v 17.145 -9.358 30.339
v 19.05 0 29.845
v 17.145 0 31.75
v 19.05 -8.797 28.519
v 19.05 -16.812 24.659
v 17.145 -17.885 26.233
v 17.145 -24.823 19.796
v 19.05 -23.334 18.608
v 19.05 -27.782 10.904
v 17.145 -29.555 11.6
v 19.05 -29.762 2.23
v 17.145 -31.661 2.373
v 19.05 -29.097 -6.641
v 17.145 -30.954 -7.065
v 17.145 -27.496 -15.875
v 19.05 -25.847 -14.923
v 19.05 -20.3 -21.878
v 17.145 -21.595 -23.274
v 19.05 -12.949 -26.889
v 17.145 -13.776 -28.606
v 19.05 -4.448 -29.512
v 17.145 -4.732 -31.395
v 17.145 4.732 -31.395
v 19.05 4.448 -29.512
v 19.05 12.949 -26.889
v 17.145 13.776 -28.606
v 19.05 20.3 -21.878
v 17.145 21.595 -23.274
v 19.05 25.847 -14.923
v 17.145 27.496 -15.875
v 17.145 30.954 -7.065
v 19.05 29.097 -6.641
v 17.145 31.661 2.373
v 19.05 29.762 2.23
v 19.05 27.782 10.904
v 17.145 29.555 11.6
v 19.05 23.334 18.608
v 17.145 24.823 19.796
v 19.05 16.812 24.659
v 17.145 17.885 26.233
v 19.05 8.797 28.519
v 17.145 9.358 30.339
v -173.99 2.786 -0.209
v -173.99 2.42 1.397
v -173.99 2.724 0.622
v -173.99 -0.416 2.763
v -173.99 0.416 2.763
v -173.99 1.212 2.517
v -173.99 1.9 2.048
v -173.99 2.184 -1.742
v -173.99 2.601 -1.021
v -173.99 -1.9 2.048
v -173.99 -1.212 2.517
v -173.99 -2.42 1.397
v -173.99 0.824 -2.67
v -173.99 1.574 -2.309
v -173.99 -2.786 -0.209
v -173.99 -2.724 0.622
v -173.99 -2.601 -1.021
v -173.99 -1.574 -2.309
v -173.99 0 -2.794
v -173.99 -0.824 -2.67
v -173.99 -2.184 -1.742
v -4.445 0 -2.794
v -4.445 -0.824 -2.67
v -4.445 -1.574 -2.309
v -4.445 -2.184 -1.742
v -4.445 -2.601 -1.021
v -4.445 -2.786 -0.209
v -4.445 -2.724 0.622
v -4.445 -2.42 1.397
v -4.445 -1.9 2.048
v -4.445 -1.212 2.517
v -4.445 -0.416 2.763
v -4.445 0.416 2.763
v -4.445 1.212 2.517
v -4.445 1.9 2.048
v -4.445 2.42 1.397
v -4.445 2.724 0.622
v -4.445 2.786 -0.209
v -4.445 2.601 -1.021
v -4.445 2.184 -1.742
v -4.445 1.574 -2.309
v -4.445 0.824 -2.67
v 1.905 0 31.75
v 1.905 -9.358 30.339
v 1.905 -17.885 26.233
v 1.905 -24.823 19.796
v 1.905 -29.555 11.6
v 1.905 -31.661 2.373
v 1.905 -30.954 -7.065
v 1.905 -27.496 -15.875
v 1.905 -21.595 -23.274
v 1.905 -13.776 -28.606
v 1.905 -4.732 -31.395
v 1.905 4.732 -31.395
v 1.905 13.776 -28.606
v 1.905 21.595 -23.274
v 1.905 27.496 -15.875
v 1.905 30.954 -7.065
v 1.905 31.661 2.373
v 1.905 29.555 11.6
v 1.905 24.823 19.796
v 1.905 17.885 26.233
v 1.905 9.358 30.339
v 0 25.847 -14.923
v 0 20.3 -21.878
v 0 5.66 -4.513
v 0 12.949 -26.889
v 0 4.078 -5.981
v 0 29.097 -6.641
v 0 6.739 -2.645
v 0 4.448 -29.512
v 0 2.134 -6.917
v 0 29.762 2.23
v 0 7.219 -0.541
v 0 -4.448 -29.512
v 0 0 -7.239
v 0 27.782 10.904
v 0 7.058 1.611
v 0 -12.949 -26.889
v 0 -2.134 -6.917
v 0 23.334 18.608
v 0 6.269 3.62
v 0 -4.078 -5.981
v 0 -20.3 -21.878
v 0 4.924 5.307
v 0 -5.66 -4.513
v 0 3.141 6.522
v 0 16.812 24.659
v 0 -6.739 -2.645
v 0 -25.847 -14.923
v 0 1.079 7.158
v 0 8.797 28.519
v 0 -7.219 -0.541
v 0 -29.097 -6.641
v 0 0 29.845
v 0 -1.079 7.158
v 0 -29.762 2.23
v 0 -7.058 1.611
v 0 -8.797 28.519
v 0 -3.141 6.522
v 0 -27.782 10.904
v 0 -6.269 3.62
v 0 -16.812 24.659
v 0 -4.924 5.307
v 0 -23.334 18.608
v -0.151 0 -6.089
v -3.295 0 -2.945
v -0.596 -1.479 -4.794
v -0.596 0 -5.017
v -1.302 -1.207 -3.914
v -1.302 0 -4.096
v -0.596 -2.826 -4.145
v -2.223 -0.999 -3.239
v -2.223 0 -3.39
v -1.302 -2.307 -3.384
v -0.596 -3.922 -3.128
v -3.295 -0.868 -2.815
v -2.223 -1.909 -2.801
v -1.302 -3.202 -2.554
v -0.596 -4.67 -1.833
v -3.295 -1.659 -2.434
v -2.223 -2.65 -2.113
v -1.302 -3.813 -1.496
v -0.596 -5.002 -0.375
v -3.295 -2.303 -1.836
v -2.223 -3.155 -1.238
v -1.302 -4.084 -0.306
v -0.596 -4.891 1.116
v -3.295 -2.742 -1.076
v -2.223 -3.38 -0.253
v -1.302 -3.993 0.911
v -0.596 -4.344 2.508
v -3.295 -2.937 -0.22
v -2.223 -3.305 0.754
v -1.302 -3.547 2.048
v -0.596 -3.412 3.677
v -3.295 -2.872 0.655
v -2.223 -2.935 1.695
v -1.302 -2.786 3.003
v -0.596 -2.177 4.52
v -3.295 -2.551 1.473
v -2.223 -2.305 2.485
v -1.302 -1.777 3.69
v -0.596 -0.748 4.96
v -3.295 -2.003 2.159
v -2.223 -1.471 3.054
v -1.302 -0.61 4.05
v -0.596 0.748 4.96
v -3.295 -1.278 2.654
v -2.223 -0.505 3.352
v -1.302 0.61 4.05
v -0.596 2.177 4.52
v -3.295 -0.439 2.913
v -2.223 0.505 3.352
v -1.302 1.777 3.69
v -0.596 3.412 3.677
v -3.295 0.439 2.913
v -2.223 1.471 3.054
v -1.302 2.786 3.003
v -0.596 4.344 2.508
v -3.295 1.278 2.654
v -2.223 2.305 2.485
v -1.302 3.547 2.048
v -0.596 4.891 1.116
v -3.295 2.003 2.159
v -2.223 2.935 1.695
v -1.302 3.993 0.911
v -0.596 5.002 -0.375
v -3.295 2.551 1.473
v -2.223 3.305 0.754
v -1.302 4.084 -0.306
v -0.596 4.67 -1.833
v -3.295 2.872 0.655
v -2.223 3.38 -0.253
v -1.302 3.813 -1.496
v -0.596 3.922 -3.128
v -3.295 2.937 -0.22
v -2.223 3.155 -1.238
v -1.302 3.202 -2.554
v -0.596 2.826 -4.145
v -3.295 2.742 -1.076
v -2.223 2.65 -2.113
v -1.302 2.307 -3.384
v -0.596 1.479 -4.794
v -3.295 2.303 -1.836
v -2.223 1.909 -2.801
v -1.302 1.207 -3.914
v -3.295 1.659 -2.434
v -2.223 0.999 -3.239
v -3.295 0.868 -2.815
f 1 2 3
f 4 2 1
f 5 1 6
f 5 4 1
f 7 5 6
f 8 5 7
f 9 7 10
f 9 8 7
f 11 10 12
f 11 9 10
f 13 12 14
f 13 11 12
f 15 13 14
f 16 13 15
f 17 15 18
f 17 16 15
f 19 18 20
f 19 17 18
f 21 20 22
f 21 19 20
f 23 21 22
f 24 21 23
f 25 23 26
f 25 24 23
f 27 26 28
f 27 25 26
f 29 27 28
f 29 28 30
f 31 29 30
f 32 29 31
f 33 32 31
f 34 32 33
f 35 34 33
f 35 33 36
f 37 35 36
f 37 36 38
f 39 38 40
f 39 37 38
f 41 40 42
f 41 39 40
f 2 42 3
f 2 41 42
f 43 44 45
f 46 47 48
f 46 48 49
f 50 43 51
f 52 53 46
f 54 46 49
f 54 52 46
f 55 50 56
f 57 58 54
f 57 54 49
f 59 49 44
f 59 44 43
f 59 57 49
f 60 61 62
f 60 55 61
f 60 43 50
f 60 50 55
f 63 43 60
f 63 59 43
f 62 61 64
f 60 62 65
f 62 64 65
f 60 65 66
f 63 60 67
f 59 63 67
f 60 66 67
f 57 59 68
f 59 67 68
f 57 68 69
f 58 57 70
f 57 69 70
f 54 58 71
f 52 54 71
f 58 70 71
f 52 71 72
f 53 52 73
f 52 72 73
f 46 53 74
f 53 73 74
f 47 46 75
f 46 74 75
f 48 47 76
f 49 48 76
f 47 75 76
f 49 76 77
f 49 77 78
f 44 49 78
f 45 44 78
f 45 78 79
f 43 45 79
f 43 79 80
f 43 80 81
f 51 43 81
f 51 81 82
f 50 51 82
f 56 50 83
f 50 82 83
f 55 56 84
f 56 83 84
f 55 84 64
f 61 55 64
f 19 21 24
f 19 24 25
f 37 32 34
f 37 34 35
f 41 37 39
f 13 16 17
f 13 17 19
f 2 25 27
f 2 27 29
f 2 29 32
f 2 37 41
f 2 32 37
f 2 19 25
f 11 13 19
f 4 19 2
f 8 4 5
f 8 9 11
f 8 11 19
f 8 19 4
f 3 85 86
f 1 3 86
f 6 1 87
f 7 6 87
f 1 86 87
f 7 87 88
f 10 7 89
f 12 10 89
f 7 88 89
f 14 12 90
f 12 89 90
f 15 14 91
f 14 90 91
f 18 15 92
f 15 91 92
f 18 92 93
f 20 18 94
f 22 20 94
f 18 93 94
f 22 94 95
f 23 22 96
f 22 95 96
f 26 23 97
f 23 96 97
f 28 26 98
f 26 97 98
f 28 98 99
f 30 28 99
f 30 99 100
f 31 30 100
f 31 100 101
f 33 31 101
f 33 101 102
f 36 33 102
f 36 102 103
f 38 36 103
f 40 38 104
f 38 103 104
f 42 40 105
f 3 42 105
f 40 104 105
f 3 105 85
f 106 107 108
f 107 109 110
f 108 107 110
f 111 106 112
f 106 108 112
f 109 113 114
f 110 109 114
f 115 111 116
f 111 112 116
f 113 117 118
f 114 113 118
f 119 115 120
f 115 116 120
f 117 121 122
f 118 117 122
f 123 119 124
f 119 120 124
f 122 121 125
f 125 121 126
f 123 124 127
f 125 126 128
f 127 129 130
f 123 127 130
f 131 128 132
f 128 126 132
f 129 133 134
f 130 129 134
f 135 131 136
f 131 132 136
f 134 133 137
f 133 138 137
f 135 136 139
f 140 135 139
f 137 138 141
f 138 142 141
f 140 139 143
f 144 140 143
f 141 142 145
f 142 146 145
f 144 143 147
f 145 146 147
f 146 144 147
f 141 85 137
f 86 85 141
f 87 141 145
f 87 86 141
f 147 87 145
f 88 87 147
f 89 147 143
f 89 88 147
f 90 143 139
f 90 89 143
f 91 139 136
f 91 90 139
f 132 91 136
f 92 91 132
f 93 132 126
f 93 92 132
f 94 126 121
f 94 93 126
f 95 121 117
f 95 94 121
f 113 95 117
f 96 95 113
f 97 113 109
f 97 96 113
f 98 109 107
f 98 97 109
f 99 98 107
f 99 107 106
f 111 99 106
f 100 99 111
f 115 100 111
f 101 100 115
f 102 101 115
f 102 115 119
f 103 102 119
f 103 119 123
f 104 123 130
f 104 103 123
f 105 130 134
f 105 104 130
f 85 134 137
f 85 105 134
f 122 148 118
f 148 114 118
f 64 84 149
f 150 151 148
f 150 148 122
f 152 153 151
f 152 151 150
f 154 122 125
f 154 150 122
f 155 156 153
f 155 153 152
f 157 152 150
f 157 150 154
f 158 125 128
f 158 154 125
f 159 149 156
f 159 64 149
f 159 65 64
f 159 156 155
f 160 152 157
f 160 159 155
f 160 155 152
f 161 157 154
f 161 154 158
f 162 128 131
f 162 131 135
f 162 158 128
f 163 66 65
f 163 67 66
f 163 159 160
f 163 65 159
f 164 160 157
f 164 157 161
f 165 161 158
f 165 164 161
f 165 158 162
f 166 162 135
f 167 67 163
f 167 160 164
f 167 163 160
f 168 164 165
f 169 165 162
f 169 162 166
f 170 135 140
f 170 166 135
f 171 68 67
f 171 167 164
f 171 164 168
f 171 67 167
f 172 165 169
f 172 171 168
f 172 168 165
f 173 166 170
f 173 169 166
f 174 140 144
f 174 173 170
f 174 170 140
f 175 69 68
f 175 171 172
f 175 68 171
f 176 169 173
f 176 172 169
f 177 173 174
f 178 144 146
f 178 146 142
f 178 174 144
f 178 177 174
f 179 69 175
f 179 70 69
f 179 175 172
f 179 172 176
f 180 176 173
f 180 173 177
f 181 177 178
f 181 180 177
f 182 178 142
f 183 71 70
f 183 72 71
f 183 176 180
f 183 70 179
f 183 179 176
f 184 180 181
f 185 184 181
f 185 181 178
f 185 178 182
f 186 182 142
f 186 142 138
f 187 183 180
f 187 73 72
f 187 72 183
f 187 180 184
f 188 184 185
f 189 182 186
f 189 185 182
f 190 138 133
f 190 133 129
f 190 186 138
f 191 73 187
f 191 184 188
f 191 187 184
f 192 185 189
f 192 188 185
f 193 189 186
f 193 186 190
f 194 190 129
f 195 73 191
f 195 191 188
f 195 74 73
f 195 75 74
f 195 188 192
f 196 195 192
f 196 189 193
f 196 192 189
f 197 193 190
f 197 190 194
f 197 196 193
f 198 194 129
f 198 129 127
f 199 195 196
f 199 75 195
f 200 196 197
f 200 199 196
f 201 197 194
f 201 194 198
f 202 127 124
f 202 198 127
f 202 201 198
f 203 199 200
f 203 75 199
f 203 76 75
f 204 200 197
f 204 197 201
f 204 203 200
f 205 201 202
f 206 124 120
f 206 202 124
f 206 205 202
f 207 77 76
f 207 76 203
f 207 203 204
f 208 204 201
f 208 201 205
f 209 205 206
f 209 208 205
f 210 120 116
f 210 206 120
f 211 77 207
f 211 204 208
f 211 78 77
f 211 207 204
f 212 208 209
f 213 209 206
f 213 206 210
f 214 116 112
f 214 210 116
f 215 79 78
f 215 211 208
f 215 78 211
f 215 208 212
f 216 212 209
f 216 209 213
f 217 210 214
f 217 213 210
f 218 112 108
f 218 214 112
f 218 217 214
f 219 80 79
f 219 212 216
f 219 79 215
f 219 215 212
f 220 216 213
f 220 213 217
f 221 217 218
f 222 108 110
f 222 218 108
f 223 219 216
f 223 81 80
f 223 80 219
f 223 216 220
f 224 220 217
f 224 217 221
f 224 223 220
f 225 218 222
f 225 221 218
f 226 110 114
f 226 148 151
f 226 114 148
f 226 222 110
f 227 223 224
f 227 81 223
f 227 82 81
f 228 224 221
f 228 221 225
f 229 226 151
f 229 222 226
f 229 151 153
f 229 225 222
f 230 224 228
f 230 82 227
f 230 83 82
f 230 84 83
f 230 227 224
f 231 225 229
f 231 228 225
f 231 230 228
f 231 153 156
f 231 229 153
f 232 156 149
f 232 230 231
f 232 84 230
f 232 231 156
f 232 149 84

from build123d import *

# Parameters (mm, degrees)
SKETCH1_R           = 31.75
BOSS_EXTRUDE1_DEPTH = 19.05
SKETCH2_R           = 2.794
BOSS_EXTRUDE2_DEPTH = 173.99
FILLET1_R           = 4.445
CHAMFER1_SIZE       = 1.905


with BuildPart() as part:
    # Sketch1 → Boss-Extrude1 (new body)
    with BuildSketch(Plane(origin=(0, 0, 0), x_dir=(0, 0, -1), z_dir=(1, 0, 0))):
        with Locations(Location((0, 0, 0), (0, 0, 180))):
            Circle(SKETCH1_R)
    extrude(amount=BOSS_EXTRUDE1_DEPTH)

    # Sketch2 → Boss-Extrude2 (add)
    with BuildSketch(Plane.ZY):
        with Locations(Location((0, 0, 0), (0, 0, 180))):
            Circle(SKETCH2_R)
    extrude(amount=BOSS_EXTRUDE2_DEPTH)

    # Fillet1
    fillet1_edges = [part.edges().sort_by_distance(p)[0] for p in [
        (0, 0, 2.794),
    ]]
    fillet(fillet1_edges, radius=FILLET1_R)

    # Chamfer1
    chamfer1_edges = [part.edges().sort_by_distance(p)[0] for p in [
        (0, 0, -31.75),
        (19.05, 0, -31.75),
    ]]
    chamfer(chamfer1_edges, length=CHAMFER1_SIZE)


solid = part.part
